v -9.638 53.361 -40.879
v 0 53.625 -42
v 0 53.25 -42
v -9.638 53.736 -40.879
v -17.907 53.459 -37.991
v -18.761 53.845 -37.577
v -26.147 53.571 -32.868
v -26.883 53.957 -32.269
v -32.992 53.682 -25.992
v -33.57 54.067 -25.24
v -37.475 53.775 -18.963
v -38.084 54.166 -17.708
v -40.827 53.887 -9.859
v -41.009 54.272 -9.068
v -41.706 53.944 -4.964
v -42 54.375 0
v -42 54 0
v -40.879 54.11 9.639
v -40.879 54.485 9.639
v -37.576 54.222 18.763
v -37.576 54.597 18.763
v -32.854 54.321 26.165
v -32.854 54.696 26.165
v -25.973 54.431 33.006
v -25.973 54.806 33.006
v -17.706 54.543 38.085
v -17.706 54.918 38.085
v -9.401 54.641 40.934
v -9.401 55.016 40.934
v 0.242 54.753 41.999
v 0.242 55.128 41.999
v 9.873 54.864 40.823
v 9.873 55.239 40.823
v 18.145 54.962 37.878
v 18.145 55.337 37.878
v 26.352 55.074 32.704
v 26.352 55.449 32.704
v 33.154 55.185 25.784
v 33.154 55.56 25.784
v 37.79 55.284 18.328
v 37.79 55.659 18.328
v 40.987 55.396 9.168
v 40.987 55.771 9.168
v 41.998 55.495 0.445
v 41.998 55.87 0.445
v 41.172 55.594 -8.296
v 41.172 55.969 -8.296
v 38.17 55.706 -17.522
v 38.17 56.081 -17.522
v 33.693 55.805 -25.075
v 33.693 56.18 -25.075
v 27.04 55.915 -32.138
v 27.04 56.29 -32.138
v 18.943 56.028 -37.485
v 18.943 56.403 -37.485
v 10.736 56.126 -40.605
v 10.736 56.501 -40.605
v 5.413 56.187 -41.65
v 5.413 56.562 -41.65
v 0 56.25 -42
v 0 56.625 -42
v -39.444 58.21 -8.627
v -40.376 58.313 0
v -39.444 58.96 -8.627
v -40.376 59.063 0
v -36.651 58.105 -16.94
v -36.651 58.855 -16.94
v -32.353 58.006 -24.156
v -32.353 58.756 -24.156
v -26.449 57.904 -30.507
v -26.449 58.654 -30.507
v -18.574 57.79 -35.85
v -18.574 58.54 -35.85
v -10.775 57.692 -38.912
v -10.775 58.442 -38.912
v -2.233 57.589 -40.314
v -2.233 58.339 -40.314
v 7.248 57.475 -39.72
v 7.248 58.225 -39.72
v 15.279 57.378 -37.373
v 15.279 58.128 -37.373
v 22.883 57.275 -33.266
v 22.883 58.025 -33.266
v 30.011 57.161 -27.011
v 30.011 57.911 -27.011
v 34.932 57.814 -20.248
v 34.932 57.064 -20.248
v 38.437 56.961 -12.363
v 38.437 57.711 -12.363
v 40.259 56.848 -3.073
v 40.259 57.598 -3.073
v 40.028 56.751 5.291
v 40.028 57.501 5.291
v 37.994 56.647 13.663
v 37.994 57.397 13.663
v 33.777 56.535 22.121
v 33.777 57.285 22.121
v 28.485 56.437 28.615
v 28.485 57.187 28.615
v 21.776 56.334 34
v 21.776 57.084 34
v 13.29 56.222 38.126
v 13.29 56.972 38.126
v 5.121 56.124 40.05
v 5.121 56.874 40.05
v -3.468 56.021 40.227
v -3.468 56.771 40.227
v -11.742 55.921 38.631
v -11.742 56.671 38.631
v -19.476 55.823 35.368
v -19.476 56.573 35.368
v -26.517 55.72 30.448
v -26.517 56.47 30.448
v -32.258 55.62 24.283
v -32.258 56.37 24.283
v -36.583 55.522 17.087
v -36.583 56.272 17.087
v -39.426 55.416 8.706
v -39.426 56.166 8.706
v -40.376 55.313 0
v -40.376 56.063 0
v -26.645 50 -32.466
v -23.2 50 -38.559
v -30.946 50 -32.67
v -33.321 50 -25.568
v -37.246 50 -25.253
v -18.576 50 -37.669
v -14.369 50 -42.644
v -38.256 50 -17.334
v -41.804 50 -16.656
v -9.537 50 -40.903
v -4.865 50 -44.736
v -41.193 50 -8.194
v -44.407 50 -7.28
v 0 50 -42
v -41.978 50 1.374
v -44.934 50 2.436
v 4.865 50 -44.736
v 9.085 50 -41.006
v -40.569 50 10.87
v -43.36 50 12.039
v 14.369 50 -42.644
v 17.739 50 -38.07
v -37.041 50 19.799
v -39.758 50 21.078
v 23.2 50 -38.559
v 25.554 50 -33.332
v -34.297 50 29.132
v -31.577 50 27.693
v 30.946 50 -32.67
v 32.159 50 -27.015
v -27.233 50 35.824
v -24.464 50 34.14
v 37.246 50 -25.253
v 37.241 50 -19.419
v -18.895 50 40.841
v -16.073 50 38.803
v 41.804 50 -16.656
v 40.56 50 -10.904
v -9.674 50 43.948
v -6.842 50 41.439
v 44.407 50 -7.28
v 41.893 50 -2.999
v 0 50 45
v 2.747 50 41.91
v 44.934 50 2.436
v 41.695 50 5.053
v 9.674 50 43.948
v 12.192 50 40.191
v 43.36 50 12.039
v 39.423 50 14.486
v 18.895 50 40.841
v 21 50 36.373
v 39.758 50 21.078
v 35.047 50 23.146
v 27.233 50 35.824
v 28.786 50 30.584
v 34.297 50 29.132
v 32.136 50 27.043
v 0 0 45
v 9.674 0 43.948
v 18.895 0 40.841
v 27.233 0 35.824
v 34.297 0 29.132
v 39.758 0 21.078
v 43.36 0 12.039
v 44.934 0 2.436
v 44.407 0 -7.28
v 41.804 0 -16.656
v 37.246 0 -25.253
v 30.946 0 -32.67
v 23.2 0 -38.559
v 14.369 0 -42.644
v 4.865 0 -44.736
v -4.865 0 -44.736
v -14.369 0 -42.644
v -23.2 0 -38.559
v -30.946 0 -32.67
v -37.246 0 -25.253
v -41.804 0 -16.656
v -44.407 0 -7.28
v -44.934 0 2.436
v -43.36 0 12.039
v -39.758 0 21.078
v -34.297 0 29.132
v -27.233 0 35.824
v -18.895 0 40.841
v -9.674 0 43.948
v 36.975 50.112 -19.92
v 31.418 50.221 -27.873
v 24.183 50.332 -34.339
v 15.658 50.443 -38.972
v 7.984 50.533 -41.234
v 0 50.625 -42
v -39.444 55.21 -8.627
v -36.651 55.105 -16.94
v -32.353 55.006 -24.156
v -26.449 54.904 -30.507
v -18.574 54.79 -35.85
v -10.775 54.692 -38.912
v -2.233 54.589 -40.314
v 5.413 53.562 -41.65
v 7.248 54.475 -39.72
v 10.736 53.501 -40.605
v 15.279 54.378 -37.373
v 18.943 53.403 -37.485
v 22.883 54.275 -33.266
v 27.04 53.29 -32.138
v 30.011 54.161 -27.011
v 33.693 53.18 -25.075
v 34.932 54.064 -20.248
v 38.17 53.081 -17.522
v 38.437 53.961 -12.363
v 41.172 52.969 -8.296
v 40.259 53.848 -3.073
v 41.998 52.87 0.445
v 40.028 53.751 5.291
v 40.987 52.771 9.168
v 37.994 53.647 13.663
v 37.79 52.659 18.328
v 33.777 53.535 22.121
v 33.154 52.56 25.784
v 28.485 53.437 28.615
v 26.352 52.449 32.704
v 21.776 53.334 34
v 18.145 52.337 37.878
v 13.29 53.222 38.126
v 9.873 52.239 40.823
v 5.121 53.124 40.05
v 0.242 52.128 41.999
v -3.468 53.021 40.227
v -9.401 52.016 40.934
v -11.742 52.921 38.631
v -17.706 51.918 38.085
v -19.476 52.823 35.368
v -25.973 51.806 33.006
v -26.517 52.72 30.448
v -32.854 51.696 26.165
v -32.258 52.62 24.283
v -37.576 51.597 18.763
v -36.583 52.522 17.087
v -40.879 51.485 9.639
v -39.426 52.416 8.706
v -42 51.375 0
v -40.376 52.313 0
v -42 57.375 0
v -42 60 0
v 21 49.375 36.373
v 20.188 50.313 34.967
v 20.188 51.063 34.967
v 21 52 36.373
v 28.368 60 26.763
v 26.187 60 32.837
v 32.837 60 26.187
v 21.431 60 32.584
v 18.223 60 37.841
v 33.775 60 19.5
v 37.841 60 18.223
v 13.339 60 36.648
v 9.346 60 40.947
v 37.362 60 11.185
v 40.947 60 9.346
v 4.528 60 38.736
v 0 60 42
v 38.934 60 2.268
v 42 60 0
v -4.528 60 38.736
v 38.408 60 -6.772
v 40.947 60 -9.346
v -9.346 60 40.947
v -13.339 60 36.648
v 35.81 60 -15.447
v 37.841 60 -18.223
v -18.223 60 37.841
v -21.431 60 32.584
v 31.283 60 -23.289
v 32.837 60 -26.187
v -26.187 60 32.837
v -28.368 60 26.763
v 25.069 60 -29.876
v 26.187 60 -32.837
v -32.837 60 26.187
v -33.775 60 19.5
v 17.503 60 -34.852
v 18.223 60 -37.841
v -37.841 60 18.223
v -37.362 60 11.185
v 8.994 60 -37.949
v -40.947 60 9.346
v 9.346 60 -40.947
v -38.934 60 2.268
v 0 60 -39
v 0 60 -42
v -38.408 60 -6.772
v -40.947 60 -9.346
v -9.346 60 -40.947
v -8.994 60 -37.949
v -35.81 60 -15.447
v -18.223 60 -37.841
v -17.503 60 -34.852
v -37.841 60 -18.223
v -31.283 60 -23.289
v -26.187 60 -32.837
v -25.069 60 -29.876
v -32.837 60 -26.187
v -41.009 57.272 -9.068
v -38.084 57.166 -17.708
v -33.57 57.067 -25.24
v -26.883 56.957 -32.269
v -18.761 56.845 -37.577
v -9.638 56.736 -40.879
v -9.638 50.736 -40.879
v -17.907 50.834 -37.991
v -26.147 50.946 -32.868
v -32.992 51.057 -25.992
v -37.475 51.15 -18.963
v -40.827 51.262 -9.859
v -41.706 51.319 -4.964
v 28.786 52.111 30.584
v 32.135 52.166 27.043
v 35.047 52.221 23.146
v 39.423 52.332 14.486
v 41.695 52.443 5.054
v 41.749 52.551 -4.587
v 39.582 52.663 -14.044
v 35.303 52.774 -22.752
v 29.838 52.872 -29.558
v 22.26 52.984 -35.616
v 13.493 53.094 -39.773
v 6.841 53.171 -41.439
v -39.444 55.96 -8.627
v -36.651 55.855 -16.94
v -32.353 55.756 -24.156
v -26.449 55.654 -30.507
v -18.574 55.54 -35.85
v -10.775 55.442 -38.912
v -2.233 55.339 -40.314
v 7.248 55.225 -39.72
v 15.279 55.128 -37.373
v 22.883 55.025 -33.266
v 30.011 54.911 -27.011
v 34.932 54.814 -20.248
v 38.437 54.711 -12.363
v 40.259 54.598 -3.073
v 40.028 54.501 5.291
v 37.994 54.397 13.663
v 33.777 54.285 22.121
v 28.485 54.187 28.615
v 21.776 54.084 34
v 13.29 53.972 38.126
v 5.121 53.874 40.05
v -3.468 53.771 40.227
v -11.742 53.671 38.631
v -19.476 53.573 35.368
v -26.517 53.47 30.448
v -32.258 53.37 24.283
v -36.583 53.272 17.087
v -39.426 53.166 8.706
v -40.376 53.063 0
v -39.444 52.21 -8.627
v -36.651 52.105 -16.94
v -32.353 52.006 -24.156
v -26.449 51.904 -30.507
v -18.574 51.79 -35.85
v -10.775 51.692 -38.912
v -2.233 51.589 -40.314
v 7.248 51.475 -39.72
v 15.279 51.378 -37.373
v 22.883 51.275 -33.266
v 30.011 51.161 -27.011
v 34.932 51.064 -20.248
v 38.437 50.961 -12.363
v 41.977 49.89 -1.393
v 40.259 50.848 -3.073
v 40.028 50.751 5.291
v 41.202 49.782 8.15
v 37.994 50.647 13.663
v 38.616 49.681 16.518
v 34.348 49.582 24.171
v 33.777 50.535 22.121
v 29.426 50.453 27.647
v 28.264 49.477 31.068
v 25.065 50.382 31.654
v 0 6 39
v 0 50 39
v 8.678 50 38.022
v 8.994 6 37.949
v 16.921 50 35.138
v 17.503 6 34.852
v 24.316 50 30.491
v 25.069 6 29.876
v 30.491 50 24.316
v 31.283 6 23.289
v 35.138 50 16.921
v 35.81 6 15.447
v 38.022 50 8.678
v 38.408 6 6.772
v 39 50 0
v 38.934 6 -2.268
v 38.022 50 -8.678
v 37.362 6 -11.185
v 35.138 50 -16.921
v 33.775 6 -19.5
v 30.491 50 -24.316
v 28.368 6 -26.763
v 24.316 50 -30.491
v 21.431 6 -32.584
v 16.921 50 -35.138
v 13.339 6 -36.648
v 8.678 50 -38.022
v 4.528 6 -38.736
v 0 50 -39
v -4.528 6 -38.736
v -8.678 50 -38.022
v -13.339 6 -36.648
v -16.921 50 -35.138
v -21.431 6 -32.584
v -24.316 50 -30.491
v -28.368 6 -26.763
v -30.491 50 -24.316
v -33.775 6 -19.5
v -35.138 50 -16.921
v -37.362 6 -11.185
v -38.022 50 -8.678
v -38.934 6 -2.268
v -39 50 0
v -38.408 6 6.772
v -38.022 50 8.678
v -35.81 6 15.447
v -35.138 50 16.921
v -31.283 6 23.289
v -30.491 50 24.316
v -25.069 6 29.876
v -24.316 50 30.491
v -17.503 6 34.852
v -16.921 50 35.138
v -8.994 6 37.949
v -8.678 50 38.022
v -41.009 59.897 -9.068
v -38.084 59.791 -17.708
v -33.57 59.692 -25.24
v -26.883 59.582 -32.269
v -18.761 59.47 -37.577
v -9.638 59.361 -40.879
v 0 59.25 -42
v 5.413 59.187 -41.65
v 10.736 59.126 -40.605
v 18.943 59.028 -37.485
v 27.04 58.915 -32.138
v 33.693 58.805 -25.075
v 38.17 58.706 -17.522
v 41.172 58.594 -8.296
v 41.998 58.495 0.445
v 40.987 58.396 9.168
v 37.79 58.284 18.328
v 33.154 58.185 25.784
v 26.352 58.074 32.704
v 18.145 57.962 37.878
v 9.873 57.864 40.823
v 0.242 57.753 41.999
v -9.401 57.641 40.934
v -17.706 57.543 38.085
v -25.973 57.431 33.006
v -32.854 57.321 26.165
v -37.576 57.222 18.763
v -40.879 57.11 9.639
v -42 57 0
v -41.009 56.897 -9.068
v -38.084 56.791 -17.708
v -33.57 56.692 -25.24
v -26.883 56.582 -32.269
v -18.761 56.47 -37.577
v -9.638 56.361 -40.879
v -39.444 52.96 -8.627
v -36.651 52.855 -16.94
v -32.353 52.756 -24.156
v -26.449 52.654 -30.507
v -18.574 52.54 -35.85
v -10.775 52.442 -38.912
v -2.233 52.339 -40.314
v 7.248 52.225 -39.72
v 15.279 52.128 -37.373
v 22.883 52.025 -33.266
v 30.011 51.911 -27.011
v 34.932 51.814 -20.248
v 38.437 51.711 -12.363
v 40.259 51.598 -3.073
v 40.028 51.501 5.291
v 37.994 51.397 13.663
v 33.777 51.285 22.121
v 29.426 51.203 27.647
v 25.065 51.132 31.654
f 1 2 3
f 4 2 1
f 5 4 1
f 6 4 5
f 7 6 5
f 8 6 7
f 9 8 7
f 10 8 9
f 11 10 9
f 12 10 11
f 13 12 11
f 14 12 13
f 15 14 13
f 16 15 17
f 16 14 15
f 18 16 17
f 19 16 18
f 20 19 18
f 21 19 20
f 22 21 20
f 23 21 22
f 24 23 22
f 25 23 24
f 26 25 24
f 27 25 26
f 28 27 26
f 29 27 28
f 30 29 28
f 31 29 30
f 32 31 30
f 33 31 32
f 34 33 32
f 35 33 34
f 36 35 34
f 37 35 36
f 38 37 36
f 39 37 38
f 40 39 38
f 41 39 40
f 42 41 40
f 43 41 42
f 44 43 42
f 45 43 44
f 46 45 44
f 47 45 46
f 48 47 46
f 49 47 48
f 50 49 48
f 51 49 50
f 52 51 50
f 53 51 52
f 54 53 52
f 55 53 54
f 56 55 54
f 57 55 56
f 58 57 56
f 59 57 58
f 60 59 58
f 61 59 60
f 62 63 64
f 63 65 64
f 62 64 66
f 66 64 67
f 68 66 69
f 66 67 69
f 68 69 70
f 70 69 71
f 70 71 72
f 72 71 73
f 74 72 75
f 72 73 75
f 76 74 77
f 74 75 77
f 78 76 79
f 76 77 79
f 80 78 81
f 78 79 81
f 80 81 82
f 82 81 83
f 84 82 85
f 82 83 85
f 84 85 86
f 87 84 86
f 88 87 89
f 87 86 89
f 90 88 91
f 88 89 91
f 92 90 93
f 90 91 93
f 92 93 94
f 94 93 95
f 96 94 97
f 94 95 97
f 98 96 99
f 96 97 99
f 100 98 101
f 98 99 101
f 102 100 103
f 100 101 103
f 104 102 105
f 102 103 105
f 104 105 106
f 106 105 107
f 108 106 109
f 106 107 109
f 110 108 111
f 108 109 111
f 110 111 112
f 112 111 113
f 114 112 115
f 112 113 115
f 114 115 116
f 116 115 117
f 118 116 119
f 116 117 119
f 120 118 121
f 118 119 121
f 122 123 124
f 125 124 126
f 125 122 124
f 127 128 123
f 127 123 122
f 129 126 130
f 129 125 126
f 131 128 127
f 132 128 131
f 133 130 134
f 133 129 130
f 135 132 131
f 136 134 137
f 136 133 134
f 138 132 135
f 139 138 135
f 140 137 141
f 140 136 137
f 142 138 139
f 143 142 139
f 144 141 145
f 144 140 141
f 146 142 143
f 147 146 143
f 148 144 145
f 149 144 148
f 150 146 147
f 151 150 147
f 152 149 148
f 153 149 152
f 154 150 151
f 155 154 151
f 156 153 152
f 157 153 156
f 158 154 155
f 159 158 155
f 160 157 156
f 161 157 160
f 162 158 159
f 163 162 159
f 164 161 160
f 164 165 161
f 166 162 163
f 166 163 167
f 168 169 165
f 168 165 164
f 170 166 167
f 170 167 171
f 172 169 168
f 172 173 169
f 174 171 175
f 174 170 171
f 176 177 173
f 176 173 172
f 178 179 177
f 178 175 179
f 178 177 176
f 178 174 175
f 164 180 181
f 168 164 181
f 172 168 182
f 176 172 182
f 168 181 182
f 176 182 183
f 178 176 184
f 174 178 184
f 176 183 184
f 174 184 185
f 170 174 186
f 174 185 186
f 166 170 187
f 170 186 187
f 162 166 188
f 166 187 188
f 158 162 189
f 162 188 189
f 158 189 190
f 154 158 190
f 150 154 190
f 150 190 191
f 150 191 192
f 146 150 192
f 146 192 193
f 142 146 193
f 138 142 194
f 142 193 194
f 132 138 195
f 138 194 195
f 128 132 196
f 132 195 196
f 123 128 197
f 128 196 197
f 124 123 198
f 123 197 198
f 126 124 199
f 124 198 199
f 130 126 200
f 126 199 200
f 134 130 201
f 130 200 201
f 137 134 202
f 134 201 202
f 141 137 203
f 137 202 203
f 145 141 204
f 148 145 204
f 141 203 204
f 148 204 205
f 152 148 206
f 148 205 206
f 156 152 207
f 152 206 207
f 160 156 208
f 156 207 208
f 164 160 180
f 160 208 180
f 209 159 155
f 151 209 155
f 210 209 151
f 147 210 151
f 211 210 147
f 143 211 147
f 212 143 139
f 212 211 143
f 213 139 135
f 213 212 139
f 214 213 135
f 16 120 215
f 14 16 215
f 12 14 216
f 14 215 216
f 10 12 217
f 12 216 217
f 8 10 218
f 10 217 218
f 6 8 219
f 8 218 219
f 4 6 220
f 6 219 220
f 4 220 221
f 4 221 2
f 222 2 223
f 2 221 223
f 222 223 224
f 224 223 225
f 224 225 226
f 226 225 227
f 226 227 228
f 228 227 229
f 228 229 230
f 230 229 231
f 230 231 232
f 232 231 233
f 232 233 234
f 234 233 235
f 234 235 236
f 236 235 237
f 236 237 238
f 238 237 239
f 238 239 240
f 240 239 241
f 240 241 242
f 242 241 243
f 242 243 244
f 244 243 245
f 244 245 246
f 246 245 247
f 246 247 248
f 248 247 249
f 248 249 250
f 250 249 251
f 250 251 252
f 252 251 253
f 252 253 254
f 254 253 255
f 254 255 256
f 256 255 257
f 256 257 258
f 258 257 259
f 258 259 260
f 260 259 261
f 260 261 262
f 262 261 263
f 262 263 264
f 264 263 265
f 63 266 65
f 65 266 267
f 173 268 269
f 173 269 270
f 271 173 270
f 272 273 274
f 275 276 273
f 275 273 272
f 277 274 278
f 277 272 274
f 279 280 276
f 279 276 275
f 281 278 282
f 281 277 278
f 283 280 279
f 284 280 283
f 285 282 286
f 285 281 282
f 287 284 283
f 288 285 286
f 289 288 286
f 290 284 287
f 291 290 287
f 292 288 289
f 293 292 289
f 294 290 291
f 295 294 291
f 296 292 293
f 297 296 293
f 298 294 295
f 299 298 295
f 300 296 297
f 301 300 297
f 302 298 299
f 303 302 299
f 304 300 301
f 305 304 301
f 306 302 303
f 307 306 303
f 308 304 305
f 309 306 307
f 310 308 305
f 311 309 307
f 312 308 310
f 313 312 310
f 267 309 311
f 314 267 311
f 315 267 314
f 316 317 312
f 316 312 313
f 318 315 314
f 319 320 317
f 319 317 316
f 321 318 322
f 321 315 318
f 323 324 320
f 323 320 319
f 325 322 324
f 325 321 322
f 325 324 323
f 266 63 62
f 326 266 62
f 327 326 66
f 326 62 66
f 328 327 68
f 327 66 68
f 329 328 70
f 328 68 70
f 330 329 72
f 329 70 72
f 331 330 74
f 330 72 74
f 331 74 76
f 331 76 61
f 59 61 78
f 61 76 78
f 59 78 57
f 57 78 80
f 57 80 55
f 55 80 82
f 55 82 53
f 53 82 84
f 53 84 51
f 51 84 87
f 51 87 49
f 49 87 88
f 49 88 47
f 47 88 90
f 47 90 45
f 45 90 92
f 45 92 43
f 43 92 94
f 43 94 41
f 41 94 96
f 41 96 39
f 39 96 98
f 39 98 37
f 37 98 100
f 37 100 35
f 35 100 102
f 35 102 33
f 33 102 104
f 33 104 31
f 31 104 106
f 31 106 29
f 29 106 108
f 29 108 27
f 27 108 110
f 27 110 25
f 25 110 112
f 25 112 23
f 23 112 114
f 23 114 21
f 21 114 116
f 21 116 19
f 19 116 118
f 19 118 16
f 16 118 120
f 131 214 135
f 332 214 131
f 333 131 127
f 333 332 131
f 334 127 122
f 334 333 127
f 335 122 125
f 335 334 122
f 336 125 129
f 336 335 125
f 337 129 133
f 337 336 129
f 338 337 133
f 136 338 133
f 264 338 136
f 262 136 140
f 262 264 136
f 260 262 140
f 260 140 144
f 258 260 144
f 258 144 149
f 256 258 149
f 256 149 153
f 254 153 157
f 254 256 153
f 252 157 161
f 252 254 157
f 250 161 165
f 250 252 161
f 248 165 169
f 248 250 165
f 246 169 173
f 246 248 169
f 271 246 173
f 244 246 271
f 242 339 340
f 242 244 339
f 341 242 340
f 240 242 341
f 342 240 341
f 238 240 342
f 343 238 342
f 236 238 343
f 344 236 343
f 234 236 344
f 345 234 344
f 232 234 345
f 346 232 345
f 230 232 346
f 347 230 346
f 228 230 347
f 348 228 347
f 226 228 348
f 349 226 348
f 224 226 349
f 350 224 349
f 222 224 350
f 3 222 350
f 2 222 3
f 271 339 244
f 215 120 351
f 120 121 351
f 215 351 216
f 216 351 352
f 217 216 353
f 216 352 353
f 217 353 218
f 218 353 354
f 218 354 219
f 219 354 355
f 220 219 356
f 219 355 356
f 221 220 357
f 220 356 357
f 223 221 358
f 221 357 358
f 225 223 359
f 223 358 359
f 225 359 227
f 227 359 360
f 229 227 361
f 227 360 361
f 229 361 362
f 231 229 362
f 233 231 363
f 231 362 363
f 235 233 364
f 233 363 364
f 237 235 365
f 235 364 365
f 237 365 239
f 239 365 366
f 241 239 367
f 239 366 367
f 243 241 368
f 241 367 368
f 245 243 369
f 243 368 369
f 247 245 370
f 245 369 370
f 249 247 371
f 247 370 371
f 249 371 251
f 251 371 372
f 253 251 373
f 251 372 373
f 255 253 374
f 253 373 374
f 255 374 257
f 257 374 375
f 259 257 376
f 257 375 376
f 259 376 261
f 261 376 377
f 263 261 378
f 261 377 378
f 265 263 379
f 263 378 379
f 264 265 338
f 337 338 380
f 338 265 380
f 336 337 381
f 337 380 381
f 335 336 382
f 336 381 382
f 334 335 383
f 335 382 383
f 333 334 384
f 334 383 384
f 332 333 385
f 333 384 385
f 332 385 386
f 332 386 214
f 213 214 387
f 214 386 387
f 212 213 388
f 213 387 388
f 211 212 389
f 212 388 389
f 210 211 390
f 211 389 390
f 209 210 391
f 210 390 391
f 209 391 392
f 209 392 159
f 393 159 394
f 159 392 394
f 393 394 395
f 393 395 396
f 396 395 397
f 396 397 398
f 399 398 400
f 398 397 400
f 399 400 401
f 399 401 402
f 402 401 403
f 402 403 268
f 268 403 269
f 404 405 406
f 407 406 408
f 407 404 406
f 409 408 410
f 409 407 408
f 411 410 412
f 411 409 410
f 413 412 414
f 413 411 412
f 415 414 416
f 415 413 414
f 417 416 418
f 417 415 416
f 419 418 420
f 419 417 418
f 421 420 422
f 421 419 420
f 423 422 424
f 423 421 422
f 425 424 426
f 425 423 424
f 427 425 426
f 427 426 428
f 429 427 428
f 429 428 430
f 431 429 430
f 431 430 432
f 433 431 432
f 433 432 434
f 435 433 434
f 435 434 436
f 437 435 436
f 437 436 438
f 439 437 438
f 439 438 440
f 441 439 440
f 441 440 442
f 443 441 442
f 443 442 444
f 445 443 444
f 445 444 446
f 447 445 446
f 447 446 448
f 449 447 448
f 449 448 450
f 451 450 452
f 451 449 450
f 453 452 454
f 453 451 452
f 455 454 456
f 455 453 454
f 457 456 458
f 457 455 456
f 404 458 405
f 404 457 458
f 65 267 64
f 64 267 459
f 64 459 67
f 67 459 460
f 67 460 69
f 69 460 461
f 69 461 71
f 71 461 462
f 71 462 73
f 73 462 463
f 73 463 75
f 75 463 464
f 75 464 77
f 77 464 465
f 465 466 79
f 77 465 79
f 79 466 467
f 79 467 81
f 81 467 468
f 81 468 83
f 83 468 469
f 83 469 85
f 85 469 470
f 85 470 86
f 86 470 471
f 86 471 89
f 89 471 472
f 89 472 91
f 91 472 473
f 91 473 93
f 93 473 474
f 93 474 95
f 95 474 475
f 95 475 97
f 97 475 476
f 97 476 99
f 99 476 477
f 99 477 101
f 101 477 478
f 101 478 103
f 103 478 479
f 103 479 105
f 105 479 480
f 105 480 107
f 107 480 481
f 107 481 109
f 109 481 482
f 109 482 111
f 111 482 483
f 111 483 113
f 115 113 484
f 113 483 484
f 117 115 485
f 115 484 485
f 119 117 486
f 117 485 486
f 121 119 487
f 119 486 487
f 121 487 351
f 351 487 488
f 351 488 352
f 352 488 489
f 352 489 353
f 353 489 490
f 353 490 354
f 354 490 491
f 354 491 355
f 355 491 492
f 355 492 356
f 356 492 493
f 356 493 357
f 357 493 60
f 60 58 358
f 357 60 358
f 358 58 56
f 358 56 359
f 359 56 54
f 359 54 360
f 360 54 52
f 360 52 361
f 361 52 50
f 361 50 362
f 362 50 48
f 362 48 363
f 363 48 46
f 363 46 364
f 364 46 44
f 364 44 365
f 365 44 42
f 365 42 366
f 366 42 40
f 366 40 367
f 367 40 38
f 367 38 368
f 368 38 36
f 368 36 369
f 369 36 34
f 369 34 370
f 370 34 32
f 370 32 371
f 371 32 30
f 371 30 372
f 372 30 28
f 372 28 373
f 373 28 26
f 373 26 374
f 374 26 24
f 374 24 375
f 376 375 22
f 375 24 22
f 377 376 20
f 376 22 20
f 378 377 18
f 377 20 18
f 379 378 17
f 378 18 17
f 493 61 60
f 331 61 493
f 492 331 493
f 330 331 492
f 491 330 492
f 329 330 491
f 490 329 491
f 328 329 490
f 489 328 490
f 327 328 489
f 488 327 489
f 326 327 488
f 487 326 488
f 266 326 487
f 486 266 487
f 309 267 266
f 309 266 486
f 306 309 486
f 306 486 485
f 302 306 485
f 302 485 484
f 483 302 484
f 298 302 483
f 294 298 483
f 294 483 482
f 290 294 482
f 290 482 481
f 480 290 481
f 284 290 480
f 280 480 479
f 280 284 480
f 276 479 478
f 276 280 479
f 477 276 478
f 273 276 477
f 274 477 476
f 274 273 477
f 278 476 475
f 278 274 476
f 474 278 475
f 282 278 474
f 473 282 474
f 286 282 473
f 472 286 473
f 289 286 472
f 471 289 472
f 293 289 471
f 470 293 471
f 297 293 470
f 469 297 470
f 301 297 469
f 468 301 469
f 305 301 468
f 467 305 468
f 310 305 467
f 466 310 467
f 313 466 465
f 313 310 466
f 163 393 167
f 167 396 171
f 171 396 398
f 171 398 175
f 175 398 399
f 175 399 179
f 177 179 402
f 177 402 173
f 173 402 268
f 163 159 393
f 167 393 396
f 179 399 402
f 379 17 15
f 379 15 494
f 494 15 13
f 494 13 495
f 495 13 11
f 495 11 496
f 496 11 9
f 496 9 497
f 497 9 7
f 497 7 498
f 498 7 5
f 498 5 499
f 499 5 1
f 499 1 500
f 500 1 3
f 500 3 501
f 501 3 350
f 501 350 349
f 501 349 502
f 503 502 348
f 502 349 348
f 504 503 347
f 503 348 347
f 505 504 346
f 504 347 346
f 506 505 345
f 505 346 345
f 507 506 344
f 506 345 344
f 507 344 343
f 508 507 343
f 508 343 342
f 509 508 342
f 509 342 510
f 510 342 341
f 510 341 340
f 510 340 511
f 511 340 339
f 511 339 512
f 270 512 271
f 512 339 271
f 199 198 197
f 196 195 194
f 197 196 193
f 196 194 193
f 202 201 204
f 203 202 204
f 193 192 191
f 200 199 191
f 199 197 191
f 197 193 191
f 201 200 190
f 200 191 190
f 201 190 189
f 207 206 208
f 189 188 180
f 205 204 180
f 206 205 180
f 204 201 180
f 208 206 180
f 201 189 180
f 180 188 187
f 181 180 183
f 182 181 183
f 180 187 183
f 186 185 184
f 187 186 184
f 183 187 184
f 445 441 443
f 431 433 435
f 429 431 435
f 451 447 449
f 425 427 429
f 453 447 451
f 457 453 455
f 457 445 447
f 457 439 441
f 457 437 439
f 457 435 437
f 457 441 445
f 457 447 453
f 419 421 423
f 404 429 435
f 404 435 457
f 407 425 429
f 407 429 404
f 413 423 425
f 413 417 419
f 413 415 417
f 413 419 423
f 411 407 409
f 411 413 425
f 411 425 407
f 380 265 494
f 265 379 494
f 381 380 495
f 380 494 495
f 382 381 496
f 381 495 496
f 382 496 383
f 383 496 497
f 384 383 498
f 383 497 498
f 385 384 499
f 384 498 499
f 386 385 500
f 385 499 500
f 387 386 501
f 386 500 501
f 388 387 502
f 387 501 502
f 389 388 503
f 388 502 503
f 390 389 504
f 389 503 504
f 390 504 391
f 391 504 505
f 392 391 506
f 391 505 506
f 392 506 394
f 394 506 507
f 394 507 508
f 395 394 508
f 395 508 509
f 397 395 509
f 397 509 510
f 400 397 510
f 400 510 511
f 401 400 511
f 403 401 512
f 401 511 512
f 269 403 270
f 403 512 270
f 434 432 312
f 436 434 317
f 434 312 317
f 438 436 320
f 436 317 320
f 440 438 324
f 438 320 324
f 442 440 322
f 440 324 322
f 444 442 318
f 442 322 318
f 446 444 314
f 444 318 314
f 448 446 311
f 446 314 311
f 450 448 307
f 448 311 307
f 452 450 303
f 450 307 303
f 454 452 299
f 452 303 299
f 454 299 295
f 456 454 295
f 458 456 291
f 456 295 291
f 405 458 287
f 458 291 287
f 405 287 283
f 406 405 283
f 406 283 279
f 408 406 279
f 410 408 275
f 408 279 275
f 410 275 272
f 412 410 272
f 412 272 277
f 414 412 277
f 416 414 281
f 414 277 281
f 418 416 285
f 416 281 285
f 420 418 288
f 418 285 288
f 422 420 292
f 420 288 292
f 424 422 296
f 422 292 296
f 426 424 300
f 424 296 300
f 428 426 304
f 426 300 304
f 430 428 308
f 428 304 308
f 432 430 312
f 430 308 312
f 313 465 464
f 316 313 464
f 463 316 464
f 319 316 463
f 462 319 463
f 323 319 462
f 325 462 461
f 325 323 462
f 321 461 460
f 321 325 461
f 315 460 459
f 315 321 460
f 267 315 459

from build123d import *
from build123d.topology import SkipClean

# Parameters (mm, degrees)
SKETCH1_R           = 45
BOSS_EXTRUDE1_DEPTH = 50
SHELL1_T            = -6
SKETCH3_W           = 3
SKETCH3_H           = 10
THREAD1_PITCH       = 3


with BuildPart() as part:
    # Sketch1 → Boss-Extrude1 (new body)
    with BuildSketch(Plane(origin=(0, 0, 0), x_dir=(1, 0, 0), z_dir=(0, 1, 0))):
        with Locations(Location((0, 0, 0), (0, 0, 270))):
            Circle(SKETCH1_R)
    extrude(amount=BOSS_EXTRUDE1_DEPTH)

    # Shell1
    shell1_openings = [part.faces().sort_by_distance(p)[0] for p in [
        (0, 50, 0),
    ]]
    offset(amount=SHELL1_T, openings=shell1_openings, kind=Kind.INTERSECTION)

    # Sketch3 → Revolve1 (revolve)
    with SkipClean():  # the faces are left unmerged after this step: merging them gives an invalid solid
        with BuildSketch(Plane.XY, mode=Mode.PRIVATE) as revolve1_sk:
            with Locations((-40.5, 55)):
                Rectangle(SKETCH3_W, SKETCH3_H)
        revolve(revolve1_sk.sketch.rotate(Axis((0, 0, 0), (0, 1, 0)), 270), axis=Axis((0, 0, 0), (0, 1, 0)))
    add(part.part.scale(1), mode=Mode.REPLACE)  # the faces are merged on a copy

    # Thread1: the profile of Thread Profile1 profile screwed along a right-hand helix of 2.666667 turns, 10 arcs to a turn; built about Z, then put on its axis
    thread1_z = Axis((0, 0, 0), (0, 0, 1))
    thread1_corners = [(42.0003, 0, -0.000173205), (42.0003, 0, 2.625173197), (40.376202375, 0, 1.687499996), (40.376202375, 0, 0.937499996)]
    with BuildLine(mode=Mode.PRIVATE) as thread1_profile:
        Line(thread1_corners[0], thread1_corners[1])
        Line(thread1_corners[1], thread1_corners[2])
        Line(thread1_corners[2], thread1_corners[3])
        Line(thread1_corners[3], thread1_corners[0])
    thread1_cap = Face(thread1_profile.wire())
    thread1_turn_angles = [0, 18, 36, 54, 72, 90, 108, 126, 144, 162, 180, 198, 216, 234, 252, 270, 288, 306, 324, 342, 360]
    thread1_turn_weights = [1, 0.9510565162951535, 1, 0.9510565162951535, 1, 0.9510565162951535, 1, 0.9510565162951535, 1, 0.9510565162951535, 1, 0.9510565162951535, 1, 0.9510565162951535, 1, 0.9510565162951535, 1, 0.9510565162951535, 1, 0.9510565162951535, 1]
    thread1_turn_rails = [Edge.make_bspline([Vector(p[0], p[1], 0).rotate(thread1_z, thread1_turn_angles[k]) / thread1_turn_weights[k] + Vector(0, 0, p[2] + THREAD1_PITCH * thread1_turn_angles[k] / 360) for k in range(21)], [0, 0, 0, 1, 1, 2, 2, 3, 3, 4, 4, 5, 5, 6, 6, 7, 7, 8, 8, 9, 9, 10, 10, 10], 2, thread1_turn_weights) for p in thread1_corners]
    thread1_turn_sides = [Face.make_surface_from_curves(thread1_turn_rails[p[0]], thread1_turn_rails[p[1]]) for p in [(0, 1), (1, 2), (2, 3), (3, 0)]]
    thread1_last_angles = [720, 738, 756, 774, 792, 810, 828, 846, 864, 882, 900, 918, 936, 948, 960]
    thread1_last_weights = [1, 0.9510565162951535, 1, 0.9510565162951535, 1, 0.9510565162951535, 1, 0.9510565162951535, 1, 0.9510565162951535, 1, 0.9510565162951535, 1, 0.978147600733806, 1]
    thread1_last_rails = [Edge.make_bspline([Vector(p[0], p[1], 0).rotate(thread1_z, thread1_last_angles[k]) / thread1_last_weights[k] + Vector(0, 0, p[2] + THREAD1_PITCH * thread1_last_angles[k] / 360) for k in range(15)], [0, 0, 0, 1, 1, 2, 2, 3, 3, 4, 4, 5, 5, 6, 6, 7, 7, 7], 2, thread1_last_weights) for p in thread1_corners]
    thread1_last_sides = [Face.make_surface_from_curves(thread1_last_rails[p[0]], thread1_last_rails[p[1]]) for p in [(0, 1), (1, 2), (2, 3), (3, 0)]]
    thread1 = Plane(origin=(0, 60, 0), x_dir=(-1, 0, 0), z_dir=(0, -1, 0)) * Solid(Shell([*[p.moved(Location((0, 0, THREAD1_PITCH * i))) for i in range(2) for p in thread1_turn_sides], *thread1_last_sides, thread1_cap, thread1_cap.rotate(thread1_z, 960).moved(Location((0, 0, THREAD1_PITCH * 960 / 360)))]))
    add(thread1, mode=Mode.SUBTRACT)


solid = part.part
